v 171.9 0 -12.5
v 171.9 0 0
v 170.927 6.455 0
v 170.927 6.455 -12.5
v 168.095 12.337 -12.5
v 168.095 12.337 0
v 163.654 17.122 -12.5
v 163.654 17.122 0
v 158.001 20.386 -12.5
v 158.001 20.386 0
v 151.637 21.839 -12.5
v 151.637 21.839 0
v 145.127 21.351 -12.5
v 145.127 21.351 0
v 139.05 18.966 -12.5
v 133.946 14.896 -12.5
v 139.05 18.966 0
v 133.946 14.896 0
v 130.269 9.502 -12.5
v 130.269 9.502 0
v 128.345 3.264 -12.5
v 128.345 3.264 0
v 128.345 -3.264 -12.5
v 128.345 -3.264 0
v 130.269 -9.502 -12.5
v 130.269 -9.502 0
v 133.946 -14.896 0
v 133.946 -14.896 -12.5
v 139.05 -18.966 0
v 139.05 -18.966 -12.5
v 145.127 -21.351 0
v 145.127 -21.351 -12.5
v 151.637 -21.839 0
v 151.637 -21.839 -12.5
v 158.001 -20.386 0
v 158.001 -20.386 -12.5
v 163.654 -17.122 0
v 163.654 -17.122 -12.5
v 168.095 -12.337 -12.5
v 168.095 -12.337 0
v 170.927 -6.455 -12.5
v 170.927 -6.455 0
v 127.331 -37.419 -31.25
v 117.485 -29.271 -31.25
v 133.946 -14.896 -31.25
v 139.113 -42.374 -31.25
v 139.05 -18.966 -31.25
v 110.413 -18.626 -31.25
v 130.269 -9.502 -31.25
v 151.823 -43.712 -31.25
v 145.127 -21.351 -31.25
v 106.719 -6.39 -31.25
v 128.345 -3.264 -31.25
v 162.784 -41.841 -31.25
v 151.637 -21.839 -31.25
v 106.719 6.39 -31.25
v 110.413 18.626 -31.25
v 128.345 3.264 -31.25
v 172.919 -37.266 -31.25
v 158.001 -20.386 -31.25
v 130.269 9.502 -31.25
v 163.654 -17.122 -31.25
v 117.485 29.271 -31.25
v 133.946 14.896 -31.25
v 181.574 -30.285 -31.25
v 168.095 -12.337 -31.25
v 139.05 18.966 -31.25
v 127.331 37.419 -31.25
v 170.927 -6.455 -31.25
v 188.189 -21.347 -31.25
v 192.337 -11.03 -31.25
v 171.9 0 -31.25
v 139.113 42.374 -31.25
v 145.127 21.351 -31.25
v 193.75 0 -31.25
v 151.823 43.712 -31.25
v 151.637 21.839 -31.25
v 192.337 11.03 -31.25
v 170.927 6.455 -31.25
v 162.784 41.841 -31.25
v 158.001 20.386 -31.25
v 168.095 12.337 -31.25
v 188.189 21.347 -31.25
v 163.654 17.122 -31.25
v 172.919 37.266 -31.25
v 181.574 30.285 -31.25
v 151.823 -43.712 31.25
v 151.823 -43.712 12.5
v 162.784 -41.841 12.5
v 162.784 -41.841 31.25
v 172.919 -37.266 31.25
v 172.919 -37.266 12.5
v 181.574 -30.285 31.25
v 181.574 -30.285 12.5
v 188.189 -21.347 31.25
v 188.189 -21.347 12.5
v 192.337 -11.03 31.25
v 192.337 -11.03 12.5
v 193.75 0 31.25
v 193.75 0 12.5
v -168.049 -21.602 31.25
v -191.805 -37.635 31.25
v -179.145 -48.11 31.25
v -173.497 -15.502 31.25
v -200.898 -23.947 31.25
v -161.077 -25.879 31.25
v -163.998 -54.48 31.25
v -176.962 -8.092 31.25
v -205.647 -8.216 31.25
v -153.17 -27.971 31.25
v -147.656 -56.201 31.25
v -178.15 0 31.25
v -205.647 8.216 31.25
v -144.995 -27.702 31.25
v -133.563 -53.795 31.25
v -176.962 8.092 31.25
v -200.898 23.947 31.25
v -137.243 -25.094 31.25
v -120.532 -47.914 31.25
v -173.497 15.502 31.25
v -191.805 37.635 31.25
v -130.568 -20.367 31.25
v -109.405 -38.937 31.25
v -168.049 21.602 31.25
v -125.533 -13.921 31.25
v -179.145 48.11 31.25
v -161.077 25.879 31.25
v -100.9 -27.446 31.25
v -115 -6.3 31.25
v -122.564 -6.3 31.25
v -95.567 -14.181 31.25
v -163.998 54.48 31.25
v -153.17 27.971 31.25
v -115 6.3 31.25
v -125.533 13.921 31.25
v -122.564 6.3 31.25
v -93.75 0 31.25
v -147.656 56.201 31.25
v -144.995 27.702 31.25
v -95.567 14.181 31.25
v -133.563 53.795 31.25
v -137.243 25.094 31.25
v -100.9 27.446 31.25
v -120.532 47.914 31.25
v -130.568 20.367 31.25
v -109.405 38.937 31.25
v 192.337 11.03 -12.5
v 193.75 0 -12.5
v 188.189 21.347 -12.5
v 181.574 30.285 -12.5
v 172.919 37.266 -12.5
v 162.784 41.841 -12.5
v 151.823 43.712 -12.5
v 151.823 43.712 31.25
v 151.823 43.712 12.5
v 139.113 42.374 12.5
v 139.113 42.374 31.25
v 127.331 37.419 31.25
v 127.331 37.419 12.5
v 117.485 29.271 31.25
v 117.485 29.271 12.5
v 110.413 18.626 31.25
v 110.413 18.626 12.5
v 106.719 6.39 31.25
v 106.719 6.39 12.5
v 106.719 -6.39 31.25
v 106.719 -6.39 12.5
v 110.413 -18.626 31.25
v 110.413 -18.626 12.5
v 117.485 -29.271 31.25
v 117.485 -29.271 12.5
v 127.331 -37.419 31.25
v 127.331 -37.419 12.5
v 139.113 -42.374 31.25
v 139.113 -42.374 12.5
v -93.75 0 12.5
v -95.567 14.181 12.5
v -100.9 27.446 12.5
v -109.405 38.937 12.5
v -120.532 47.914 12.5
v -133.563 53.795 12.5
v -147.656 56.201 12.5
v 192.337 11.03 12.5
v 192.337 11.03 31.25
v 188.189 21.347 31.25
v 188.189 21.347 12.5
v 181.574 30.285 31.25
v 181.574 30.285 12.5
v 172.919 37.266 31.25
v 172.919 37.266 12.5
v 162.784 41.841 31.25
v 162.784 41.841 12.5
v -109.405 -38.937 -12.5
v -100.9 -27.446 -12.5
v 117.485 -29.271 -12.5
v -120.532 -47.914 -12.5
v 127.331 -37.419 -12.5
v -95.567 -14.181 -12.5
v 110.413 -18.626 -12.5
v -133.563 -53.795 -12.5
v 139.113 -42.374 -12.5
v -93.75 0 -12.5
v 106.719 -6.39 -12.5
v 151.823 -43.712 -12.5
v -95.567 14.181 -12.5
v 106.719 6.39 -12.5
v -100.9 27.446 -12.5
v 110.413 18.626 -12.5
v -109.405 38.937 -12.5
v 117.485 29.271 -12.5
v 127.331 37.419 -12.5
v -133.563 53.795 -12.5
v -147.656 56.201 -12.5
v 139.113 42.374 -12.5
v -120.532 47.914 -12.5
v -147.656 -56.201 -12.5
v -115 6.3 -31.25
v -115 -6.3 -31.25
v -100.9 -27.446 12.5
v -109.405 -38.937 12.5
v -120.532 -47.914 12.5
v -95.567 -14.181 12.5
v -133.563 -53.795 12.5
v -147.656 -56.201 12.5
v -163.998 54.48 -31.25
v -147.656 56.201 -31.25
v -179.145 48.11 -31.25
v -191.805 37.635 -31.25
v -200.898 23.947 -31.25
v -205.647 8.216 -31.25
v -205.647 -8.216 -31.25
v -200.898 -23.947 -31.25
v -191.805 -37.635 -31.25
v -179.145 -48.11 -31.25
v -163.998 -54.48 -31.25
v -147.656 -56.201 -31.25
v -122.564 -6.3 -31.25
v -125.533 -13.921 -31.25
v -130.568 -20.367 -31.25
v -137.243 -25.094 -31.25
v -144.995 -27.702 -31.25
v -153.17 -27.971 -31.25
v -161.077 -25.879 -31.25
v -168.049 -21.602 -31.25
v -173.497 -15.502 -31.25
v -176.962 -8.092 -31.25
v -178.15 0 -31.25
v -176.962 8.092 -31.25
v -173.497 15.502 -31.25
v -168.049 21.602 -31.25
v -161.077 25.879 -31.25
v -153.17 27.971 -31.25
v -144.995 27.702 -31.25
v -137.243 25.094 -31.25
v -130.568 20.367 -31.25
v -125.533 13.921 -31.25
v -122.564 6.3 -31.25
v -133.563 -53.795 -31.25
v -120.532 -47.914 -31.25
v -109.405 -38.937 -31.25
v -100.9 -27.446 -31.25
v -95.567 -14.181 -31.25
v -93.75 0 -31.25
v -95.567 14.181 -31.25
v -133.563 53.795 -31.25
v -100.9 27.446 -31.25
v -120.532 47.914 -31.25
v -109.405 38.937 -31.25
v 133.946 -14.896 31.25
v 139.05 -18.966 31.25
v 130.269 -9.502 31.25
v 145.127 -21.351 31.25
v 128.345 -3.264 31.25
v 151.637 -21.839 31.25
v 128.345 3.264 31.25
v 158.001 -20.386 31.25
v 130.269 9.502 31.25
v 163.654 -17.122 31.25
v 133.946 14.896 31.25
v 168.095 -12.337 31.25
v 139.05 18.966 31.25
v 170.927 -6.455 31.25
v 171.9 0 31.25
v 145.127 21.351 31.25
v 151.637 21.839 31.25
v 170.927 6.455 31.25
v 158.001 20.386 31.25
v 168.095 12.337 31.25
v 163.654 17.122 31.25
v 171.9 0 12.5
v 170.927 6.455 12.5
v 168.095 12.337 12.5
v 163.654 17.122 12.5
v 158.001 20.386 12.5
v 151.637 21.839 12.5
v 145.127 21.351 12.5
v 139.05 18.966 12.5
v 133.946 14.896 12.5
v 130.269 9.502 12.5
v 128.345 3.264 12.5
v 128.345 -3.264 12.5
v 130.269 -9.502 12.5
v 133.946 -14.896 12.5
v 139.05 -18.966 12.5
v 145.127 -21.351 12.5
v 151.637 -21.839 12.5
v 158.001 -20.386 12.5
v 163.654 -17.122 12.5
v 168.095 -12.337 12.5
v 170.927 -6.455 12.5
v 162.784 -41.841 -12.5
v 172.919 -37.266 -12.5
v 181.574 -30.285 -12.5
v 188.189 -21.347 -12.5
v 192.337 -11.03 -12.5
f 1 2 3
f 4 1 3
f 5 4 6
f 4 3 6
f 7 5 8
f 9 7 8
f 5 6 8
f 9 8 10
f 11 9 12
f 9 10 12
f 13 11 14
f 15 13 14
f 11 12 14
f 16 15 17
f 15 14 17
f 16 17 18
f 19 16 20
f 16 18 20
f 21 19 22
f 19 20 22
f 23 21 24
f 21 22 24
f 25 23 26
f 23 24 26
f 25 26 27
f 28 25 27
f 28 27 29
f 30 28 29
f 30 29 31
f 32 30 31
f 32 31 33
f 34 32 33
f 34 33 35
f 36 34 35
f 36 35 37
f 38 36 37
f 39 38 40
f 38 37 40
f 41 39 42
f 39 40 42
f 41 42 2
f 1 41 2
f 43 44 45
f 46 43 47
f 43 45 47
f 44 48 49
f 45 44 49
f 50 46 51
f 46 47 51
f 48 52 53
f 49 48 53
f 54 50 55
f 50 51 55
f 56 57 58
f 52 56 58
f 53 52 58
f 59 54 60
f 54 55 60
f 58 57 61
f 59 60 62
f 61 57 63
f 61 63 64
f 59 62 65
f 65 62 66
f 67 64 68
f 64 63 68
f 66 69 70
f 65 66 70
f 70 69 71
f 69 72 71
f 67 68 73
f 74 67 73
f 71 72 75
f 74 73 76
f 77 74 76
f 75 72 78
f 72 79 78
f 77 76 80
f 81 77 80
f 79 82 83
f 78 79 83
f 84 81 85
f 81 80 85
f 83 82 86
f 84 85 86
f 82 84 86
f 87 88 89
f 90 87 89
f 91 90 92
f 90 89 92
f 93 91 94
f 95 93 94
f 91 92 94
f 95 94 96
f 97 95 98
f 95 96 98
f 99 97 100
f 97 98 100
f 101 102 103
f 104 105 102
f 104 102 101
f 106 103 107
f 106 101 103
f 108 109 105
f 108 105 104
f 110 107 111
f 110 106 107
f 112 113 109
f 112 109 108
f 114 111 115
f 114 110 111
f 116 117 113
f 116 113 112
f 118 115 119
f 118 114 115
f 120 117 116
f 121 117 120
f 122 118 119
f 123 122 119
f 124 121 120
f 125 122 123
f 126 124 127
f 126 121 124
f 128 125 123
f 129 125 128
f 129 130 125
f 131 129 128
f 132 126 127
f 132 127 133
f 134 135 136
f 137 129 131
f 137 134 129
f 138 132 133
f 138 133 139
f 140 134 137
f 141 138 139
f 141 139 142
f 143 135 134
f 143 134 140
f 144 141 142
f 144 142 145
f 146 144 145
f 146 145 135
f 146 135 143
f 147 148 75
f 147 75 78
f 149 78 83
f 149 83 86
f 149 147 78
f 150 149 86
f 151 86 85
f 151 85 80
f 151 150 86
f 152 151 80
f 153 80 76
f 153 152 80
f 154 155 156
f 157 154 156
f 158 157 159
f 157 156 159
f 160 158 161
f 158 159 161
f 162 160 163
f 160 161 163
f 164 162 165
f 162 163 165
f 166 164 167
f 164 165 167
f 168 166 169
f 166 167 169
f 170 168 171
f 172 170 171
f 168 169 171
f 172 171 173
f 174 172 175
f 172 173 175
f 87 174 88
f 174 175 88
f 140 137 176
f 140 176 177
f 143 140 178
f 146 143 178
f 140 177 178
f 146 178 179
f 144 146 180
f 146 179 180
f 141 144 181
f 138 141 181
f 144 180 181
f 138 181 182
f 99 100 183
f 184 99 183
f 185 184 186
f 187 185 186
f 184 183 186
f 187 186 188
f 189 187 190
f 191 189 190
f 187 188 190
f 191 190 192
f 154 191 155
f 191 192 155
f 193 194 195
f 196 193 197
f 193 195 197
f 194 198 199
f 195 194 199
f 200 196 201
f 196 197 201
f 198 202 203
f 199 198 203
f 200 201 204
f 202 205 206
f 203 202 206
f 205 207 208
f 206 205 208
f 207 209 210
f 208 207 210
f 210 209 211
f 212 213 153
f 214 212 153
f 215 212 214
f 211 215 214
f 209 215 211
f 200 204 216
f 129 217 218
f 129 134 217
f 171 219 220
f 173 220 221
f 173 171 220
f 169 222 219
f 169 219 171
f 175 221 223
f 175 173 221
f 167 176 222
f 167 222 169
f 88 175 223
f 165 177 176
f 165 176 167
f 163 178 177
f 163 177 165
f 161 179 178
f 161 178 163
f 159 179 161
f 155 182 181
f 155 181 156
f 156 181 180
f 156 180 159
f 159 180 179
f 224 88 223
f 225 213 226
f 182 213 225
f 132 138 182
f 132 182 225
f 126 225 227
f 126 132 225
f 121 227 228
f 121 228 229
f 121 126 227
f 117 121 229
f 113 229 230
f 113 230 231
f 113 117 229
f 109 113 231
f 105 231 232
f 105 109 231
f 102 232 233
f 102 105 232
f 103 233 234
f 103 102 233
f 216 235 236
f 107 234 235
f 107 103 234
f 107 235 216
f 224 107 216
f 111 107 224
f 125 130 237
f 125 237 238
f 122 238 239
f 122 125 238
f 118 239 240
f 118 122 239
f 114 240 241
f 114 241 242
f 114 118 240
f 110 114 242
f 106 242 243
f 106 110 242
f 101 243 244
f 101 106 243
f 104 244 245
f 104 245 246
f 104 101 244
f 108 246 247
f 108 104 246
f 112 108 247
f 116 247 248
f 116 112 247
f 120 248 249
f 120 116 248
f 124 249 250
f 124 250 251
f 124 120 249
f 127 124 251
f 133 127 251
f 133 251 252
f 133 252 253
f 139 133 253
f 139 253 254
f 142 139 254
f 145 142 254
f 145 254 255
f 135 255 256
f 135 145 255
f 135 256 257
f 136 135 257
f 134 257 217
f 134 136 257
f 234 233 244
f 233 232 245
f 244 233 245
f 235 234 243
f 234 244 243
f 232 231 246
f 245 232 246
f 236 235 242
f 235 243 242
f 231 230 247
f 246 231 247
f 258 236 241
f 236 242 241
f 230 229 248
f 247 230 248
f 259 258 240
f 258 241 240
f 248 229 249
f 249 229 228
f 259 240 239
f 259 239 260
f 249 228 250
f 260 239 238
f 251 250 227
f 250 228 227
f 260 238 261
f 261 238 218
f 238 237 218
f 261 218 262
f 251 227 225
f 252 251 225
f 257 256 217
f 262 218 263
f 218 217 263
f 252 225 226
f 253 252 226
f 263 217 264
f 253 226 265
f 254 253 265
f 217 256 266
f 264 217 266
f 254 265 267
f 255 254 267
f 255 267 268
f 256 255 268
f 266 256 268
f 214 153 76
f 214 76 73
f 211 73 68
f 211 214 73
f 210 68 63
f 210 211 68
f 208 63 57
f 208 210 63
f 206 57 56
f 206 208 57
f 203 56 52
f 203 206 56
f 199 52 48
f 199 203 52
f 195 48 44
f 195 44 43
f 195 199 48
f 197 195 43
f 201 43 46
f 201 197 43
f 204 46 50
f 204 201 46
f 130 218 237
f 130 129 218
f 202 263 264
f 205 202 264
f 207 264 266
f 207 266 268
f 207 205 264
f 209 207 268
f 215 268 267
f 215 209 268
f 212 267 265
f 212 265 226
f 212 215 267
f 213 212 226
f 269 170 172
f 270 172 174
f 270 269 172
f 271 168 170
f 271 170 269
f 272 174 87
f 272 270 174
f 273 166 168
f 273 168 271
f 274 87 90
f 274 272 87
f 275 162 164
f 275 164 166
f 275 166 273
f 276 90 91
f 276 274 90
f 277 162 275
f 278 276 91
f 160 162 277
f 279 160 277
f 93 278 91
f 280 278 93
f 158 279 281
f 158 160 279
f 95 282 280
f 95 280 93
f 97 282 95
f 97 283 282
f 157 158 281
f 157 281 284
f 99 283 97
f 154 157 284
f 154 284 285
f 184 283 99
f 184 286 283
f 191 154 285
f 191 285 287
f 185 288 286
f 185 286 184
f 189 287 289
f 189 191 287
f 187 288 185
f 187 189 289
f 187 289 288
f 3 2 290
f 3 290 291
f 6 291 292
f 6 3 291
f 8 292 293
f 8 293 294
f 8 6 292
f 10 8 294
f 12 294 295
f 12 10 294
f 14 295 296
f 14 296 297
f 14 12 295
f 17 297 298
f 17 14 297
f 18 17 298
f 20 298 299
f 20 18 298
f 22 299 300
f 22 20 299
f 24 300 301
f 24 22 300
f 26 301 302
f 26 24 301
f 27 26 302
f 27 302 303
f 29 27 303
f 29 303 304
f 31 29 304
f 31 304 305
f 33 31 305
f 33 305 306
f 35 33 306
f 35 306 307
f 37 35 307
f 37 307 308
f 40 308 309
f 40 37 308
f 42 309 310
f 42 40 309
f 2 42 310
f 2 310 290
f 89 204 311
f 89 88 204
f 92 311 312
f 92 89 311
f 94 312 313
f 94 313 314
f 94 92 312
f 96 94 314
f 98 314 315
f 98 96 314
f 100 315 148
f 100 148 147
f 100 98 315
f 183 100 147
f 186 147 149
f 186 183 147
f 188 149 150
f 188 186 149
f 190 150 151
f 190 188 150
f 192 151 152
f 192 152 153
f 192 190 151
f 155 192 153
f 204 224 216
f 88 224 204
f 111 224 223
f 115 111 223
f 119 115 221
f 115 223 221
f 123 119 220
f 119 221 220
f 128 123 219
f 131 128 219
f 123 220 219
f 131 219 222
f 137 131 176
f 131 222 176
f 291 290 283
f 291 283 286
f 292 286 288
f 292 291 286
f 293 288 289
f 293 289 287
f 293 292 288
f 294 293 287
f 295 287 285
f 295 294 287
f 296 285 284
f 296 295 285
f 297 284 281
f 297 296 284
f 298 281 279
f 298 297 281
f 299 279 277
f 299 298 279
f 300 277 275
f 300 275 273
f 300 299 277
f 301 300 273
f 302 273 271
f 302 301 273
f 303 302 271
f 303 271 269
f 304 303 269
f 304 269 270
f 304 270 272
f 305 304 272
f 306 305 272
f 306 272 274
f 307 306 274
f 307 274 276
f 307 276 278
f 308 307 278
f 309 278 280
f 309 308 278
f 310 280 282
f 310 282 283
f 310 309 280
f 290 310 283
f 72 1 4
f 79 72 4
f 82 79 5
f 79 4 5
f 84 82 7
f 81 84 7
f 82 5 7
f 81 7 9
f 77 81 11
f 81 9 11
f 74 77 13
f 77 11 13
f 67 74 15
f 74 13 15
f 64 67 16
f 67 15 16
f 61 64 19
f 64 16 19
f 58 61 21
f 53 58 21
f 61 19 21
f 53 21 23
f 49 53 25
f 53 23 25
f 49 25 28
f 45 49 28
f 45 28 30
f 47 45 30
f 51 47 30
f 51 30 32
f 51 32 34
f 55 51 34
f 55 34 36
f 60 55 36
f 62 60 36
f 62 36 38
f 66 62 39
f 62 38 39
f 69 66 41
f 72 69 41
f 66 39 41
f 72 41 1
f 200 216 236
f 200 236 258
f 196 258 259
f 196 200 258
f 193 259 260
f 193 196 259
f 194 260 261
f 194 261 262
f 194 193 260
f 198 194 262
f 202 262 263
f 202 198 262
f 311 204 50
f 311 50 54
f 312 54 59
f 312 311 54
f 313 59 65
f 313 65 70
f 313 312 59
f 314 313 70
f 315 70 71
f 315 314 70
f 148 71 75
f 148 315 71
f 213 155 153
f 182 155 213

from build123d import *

# Parameters (mm, degrees)
F0_R          = 21.9
F1_DEPTH      = 12.5
F1_DEPTH_BACK = 12.5
F2_R          = 21.9
F3_DEPTH      = 18.75


with BuildPart() as f1:
    # F0 (on Top) → F1 (new body, two sides)
    with BuildSketch(Plane.XY) as f1_sk:
        with BuildLine():
            Line((151.822917, 43.712006), (-147.65625, 56.201151))
            ThreePointArc((-147.65625, 56.201151), (-206.25, 0), (-147.65625, -56.201151))
            Line((-147.65625, -56.201151), (151.822917, -43.712006))
            ThreePointArc((151.822917, -43.712006), (193.75, 0), (151.822917, 43.712006))
        make_face()
        with BuildLine():
            ThreePointArc((-122.564029, -6.3), (-178.15, 0), (-122.564029, 6.3))
            Line((-122.564029, 6.3), (-115, 6.3))
            Line((-115, 6.3), (-115, -6.3))
            Line((-115, -6.3), (-122.564029, -6.3))
        make_face(mode=Mode.SUBTRACT)
        with Locations((150, 0)):
            Circle(F0_R, mode=Mode.SUBTRACT)
    extrude(amount=F1_DEPTH)
    extrude(f1_sk.sketch, amount=-F1_DEPTH_BACK)

    # F2 (on face) → F3 (join)
    with BuildSketch(Plane.XY.offset(12.5)):
        with BuildLine():
            ThreePointArc((-147.65625, -56.201151), (-109.405059, -38.937299), (-93.75, 0))
            ThreePointArc((-93.75, 0), (-109.405059, 38.937299), (-147.65625, 56.201151))
            ThreePointArc((-147.65625, 56.201151), (-206.25, 0), (-147.65625, -56.201151))
        make_face()
        with BuildLine():
            ThreePointArc((-122.564029, -6.3), (-178.15, 0), (-122.564029, 6.3))
            Line((-122.564029, 6.3), (-115, 6.3))
            Line((-115, 6.3), (-115, -6.3))
            Line((-115, -6.3), (-122.564029, -6.3))
        make_face(mode=Mode.SUBTRACT)
        with BuildLine():
            ThreePointArc((193.75, 0), (181.573843, 30.284566), (151.822917, 43.712006))
            ThreePointArc((151.822917, 43.712006), (106.25, 0), (151.822917, -43.712006))
            ThreePointArc((151.822917, -43.712006), (181.573843, -30.284566), (193.75, 0))
        make_face()
        with Locations((150, 0)):
            Circle(F2_R, mode=Mode.SUBTRACT)
    extrude(amount=F3_DEPTH)

    # F4: F1 across plane


with BuildPart() as f1_1:
    add(f1.part)
    add(f1.part.mirror(Plane.XY))


solid = f1_1.part
